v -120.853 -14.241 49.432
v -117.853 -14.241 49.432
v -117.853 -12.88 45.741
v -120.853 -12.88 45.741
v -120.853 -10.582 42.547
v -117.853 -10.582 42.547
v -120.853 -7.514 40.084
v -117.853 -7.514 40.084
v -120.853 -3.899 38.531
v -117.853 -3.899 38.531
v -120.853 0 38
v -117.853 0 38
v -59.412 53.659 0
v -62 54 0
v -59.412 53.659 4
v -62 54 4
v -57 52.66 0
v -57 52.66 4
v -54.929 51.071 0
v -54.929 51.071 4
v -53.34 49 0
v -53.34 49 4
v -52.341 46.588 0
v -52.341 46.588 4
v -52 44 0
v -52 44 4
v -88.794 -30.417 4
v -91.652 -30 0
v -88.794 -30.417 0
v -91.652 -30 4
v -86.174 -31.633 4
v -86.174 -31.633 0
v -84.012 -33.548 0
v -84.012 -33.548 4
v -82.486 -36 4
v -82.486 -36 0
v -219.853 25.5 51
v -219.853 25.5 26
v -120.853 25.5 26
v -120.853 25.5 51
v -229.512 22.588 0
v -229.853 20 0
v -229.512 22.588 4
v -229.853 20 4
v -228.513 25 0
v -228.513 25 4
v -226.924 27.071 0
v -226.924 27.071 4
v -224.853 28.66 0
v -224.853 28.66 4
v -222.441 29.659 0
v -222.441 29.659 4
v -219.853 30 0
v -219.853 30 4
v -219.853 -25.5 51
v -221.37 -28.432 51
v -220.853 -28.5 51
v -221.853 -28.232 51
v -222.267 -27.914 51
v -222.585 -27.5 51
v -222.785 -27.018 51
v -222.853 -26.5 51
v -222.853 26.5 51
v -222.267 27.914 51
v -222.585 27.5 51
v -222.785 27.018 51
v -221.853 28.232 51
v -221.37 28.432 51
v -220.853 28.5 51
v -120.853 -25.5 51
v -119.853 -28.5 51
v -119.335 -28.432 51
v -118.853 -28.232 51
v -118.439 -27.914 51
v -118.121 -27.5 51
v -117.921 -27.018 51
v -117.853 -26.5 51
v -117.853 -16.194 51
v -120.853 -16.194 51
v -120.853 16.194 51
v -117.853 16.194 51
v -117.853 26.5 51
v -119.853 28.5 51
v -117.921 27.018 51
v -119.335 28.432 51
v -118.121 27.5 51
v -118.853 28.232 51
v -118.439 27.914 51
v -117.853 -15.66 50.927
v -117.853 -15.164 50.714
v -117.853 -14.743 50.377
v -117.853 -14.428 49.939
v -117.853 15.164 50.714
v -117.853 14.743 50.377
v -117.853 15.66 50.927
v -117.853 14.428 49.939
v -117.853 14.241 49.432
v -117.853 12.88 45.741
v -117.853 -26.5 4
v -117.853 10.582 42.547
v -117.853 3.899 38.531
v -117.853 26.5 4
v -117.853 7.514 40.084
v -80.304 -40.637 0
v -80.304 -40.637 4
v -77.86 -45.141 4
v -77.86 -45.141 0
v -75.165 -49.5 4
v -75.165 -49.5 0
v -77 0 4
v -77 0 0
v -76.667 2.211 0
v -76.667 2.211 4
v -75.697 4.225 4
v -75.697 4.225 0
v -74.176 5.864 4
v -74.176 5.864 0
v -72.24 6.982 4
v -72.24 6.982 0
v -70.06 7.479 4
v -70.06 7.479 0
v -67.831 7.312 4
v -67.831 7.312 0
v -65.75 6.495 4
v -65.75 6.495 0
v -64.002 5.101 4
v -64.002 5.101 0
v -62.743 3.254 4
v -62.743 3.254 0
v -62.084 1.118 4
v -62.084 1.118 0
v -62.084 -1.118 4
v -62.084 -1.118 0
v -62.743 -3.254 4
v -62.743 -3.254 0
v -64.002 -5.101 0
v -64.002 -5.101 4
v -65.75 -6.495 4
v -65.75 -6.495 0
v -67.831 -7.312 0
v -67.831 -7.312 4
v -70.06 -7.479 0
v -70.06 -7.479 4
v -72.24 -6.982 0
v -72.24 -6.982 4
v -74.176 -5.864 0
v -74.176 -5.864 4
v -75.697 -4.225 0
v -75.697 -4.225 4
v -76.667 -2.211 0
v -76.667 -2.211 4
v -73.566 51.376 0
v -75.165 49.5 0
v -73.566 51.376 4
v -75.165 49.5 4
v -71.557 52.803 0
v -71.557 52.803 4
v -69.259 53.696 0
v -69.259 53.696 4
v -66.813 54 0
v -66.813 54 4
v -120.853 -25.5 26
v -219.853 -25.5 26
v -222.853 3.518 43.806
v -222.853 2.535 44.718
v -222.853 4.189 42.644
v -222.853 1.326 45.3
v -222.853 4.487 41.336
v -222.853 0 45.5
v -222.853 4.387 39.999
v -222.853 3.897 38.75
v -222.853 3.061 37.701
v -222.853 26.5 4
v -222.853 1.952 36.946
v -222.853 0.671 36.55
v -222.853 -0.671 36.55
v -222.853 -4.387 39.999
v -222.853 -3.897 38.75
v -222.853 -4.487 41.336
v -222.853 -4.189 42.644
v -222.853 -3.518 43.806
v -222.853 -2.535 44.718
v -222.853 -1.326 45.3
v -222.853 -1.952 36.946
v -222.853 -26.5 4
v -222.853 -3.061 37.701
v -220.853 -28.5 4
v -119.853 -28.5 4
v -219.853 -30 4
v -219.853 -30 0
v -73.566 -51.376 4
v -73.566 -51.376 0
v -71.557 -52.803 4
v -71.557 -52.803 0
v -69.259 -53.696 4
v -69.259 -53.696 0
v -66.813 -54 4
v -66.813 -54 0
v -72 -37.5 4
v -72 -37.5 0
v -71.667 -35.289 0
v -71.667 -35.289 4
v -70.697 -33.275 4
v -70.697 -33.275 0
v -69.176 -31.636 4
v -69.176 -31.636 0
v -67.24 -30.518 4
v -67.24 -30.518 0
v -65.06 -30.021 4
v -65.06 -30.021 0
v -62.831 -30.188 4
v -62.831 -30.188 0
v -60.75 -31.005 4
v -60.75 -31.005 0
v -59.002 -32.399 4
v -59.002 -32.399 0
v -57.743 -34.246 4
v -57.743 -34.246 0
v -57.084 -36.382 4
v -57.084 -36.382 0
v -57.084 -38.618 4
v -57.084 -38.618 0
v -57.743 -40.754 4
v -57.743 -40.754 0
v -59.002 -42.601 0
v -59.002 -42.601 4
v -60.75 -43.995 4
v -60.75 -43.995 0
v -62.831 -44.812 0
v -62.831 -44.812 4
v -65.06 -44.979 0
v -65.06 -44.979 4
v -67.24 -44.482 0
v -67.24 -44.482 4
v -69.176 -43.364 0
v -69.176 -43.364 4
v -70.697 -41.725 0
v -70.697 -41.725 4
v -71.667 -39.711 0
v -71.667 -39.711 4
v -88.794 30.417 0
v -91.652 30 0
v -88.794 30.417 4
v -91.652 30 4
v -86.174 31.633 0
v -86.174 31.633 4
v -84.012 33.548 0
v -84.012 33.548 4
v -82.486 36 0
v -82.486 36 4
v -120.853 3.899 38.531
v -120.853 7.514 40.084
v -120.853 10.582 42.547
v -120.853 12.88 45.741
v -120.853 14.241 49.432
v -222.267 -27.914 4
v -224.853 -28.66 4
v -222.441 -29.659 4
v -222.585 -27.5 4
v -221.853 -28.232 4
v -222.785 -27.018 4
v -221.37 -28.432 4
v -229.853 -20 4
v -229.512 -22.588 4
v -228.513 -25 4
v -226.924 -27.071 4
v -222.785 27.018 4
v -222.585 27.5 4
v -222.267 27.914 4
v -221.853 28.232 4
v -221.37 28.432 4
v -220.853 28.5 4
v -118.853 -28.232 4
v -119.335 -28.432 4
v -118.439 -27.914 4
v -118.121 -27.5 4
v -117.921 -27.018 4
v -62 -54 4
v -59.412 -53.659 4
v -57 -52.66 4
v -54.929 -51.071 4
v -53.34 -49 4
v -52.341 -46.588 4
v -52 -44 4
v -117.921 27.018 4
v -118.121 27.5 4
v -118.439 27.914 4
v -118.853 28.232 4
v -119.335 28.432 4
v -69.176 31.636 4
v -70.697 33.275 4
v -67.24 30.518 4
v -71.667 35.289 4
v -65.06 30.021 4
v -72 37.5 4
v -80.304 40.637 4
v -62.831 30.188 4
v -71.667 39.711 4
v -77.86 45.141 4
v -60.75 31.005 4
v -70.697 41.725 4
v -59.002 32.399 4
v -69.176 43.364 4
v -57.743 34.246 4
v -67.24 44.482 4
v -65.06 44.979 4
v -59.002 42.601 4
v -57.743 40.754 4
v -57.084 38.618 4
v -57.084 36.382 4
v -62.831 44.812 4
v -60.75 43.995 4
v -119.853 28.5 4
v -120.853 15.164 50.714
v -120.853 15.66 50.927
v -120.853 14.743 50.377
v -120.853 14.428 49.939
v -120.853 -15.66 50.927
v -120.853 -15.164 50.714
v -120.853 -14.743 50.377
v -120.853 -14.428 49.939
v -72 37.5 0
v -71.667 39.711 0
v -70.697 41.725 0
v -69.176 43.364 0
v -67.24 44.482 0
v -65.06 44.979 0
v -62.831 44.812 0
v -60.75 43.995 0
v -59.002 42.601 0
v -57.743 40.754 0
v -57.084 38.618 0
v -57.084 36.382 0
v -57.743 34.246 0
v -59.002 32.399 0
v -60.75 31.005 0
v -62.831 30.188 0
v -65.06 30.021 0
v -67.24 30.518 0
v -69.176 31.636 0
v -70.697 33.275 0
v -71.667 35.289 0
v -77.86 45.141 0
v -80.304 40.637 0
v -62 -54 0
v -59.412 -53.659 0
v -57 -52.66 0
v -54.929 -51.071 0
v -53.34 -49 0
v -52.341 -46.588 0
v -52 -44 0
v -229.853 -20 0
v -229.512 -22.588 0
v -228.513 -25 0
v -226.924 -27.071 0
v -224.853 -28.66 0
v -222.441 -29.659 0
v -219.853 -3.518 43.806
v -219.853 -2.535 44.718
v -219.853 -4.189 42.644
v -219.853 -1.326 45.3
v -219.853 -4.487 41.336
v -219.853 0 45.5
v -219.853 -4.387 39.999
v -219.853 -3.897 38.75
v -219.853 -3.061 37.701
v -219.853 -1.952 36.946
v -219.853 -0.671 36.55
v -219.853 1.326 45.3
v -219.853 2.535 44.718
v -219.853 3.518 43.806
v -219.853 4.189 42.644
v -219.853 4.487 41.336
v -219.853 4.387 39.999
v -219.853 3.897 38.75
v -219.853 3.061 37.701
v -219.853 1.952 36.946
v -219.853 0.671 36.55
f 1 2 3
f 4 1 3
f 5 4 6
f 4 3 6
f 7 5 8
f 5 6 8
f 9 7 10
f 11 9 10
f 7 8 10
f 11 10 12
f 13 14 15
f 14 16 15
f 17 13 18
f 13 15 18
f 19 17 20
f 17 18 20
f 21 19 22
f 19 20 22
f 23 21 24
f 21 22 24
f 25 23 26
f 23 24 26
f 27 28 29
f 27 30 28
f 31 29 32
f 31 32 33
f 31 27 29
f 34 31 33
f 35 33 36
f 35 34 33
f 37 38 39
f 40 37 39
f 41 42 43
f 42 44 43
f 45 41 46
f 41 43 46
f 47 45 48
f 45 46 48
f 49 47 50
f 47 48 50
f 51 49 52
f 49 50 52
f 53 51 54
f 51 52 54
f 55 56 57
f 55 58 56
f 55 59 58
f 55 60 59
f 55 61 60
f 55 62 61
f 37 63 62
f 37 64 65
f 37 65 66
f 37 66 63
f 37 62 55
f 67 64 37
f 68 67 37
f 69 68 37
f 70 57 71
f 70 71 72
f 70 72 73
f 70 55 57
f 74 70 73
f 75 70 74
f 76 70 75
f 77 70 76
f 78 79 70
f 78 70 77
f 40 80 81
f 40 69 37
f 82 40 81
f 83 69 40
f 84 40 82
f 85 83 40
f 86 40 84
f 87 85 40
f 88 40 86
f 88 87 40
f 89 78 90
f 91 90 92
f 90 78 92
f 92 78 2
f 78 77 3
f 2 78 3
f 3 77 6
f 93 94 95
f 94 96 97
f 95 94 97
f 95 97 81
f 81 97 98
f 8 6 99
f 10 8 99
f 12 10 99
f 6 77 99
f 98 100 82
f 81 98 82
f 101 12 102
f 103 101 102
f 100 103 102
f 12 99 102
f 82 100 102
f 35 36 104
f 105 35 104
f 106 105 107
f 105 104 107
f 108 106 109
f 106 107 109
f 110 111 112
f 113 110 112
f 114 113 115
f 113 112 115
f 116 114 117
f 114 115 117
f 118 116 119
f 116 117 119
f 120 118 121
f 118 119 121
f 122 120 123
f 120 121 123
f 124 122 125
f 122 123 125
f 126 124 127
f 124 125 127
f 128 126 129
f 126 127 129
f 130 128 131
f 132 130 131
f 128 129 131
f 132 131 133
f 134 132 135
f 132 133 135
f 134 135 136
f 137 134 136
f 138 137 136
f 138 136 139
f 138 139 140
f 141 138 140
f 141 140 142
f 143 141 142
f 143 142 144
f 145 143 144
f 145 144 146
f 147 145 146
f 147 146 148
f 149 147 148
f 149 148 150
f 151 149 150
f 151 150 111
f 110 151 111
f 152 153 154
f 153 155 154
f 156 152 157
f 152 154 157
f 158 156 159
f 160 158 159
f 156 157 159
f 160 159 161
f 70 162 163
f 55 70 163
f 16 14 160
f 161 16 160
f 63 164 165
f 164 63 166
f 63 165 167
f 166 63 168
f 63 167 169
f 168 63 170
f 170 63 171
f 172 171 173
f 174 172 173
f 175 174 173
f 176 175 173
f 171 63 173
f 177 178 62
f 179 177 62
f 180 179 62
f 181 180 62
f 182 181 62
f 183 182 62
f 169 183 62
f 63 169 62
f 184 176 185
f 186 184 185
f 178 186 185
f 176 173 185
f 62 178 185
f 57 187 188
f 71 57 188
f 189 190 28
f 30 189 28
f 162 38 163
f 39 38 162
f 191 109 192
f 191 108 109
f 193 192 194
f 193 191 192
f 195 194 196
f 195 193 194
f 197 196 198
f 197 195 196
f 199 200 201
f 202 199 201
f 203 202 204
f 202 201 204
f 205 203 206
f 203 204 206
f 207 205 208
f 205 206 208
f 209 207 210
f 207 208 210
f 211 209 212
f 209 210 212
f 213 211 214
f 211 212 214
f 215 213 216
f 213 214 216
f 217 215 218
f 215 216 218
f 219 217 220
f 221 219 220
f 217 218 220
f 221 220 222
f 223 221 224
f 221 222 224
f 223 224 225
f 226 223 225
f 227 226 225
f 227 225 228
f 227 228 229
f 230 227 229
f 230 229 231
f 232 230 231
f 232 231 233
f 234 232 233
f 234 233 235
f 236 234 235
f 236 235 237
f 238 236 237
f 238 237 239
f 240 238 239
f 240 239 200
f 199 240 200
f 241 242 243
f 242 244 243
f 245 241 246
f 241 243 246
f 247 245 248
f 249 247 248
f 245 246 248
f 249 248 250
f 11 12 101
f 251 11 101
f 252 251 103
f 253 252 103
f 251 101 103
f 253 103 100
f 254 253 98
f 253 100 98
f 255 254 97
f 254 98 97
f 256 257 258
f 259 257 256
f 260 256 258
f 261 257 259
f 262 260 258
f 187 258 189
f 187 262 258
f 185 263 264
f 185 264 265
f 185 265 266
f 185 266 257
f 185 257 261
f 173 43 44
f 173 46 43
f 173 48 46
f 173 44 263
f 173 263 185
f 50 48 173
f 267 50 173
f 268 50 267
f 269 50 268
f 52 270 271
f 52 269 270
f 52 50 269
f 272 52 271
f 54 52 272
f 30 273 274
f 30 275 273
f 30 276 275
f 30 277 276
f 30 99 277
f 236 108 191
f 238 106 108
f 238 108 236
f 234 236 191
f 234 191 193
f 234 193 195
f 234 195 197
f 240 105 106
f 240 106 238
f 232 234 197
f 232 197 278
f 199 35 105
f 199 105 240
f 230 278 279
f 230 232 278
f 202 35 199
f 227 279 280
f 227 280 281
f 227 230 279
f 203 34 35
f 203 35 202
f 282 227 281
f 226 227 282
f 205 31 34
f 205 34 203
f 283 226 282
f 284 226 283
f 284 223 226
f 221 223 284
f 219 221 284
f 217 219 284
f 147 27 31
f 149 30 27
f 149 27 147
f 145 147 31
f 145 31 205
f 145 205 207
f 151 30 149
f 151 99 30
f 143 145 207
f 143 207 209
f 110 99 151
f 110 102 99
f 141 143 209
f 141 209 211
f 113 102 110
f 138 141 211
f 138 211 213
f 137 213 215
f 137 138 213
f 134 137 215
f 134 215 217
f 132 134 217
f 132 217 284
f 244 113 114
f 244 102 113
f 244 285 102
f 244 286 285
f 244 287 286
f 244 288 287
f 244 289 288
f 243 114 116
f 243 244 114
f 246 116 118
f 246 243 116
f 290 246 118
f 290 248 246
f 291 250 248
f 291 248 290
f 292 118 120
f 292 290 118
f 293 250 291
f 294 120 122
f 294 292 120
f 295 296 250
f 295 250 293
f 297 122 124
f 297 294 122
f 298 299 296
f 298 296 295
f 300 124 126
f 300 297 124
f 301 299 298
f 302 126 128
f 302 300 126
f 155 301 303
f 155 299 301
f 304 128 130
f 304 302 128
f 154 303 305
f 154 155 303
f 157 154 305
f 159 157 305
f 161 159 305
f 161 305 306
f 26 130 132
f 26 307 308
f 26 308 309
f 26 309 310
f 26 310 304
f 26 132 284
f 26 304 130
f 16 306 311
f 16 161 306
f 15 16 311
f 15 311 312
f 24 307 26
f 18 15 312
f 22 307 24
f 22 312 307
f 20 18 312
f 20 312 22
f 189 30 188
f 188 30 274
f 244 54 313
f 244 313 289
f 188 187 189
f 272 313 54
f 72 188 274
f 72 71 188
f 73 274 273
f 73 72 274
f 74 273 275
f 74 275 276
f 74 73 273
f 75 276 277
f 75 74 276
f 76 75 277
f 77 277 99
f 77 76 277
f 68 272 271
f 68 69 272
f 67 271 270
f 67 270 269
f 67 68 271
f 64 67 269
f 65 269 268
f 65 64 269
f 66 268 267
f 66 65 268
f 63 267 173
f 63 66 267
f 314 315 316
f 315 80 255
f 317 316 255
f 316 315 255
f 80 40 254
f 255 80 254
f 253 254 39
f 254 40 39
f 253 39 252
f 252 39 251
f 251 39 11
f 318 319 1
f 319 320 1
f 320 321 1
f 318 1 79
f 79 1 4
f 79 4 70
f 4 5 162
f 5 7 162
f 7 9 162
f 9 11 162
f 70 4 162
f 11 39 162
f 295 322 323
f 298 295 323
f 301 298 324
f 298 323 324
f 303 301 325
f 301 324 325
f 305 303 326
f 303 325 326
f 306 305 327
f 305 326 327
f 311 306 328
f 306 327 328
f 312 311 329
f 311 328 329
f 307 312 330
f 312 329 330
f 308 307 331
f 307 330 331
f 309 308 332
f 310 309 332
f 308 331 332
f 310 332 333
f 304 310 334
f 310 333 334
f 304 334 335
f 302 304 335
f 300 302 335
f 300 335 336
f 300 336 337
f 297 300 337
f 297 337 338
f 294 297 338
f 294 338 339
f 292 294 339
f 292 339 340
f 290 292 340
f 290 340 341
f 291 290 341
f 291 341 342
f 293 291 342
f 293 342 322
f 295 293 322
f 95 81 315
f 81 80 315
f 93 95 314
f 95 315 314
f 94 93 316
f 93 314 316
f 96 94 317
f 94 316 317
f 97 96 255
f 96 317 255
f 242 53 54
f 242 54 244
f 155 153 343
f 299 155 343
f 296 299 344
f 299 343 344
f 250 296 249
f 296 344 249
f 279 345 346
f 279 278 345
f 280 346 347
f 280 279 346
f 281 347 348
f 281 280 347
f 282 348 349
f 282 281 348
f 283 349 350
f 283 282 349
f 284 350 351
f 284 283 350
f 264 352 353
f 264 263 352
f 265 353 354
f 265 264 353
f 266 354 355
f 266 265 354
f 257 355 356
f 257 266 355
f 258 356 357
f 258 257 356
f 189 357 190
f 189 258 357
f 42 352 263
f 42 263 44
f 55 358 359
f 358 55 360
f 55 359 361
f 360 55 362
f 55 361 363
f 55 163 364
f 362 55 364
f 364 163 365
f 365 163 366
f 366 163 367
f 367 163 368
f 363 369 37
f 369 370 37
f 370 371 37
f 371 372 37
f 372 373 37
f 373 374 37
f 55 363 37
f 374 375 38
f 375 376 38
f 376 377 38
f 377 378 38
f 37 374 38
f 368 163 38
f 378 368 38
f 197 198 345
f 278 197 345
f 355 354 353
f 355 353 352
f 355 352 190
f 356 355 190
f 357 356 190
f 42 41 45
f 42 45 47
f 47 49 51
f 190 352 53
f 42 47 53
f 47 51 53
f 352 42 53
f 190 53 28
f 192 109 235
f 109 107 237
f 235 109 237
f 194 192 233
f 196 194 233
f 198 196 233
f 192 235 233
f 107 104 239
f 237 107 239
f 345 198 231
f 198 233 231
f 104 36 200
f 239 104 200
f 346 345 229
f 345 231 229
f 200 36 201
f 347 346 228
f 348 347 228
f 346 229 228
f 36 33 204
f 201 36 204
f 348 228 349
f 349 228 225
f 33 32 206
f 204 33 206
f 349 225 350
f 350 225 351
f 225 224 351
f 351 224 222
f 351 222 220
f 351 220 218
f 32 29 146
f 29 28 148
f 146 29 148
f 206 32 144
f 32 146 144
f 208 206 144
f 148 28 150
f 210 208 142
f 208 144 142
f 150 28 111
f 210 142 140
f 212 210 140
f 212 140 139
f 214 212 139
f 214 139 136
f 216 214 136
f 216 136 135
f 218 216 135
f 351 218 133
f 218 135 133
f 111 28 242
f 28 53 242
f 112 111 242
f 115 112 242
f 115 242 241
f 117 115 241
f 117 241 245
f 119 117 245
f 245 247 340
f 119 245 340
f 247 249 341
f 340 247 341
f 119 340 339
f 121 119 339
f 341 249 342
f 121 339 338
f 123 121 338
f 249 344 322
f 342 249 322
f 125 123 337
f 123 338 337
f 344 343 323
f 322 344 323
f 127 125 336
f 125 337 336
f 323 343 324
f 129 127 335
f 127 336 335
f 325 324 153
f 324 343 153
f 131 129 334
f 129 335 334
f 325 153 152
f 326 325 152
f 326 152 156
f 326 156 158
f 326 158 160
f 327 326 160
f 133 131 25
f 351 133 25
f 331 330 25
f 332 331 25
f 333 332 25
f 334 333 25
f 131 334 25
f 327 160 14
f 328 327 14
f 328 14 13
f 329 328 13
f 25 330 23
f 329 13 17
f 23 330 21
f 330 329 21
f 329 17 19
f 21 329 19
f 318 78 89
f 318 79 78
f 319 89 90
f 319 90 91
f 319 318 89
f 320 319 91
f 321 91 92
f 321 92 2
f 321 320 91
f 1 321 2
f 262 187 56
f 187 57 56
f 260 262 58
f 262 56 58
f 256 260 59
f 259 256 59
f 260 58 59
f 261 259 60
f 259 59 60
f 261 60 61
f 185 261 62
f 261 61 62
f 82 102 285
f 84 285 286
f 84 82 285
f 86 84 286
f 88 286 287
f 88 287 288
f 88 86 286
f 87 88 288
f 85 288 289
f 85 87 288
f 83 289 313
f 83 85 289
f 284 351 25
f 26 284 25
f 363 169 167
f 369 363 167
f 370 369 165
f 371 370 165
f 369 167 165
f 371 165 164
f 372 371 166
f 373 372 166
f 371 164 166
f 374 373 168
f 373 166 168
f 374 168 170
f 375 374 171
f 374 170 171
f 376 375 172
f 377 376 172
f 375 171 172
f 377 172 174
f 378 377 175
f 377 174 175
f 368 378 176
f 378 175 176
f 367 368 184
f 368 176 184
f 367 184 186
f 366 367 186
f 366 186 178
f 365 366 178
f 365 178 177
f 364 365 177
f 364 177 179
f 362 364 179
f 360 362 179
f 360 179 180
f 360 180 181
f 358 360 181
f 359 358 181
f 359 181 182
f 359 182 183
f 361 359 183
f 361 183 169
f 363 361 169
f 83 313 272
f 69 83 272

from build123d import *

# Parameters (mm, degrees)
RESSALTO_EXTRUS_O1_DEPTH = 4
ESBO_O2_R                = 7.5
CORTE_EXTRUS_O1_DEPTH    = 10
ESBO_O3_W                = 145
ESBO_O3_H                = 60
RESSALTO_EXTRUS_O3_DEPTH = 4
RESSALTO_EXTRUS_O4_DEPTH = 47
CORTE_EXTRUS_O3_DEPTH    = 10
ESBO_O6_R                = 4.5
CORTE_EXTRUS_O4_DEPTH    = 9
FILETE1_R                = 10
FILETE3_R                = 10
FILETE4_R                = 2
ESBO_O7_W                = 99
ESBO_O7_H                = 51
RESSALTO_EXTRUS_O5_DEPTH = 22


with BuildPart() as part:
    # Esboço1 → Ressalto-extrusão1 (new body)
    with BuildSketch(Plane.XY):
        with BuildLine():
            Line((-72, -54), (-52, -54))
            Line((-52, -54), (-52, 54))
            Line((-52, 54), (-72, 54))
            ThreePointArc((-72, 54), (-90, 0), (-72, -54))
        make_face()
    extrude(amount=RESSALTO_EXTRUS_O1_DEPTH)

    # Esboço2 → Corte-extrusão1 (cut)
    with BuildSketch(Plane(origin=(0, 0, 0), x_dir=(-1, 0, 0), z_dir=(0, 0, -1))):
        with Locations((69.5, 0)):
            Circle(ESBO_O2_R)
        with Locations((64.5, -37.5)):
            Circle(ESBO_O2_R)
        with Locations((64.5, 37.5)):
            Circle(ESBO_O2_R)
    extrude(amount=-CORTE_EXTRUS_O1_DEPTH, mode=Mode.SUBTRACT)

    # Esboço3 → Ressalto-extrusão3 (add)
    with BuildSketch(Plane.XY):
        with Locations((-157.352813742, 0)):
            Rectangle(ESBO_O3_W, ESBO_O3_H)
    extrude(amount=RESSALTO_EXTRUS_O3_DEPTH)

    # Esboço4 → Ressalto-extrusão4 (add)
    with BuildSketch(Plane.XY.offset(4)):
        Polygon((-219.852813742, 0), (-222.852813742, 0), (-222.852813742, -28.5), (-117.852813742, -28.5), (-117.852813742, 0), (-120.852813742, 0), (-120.852813742, -25.5), (-219.852813742, -25.5), align=None)
        Polygon((-222.852813742, 28.5), (-222.852813742, 0), (-219.852813742, 0), (-219.852813742, 25.5), (-120.852813742, 25.5), (-120.852813742, 0), (-117.852813742, 0), (-117.852813742, 28.5), align=None)
    extrude(amount=RESSALTO_EXTRUS_O4_DEPTH)

    # Esboço5 → Corte-extrusão3 (cut)
    with BuildSketch(Plane(origin=(-117.852813742, 0, 0), x_dir=(0, 0, -1), z_dir=(1, 0, 0))):
        with BuildLine():
            Line((-51, 14.5), (-51, -14.5))
            ThreePointArc((-51, -14.5), (-41.725847678, -9.737171047), (-38, 0))
            ThreePointArc((-38, 0), (-41.725847678, 9.737171047), (-51, 14.5))
        make_face()
    extrude(amount=-CORTE_EXTRUS_O3_DEPTH, mode=Mode.SUBTRACT)

    # Esboço6 → Corte-extrusão4 (cut)
    with BuildSketch(Plane.ZY.offset(222.852813742)):
        with Locations((41, 0)):
            Circle(ESBO_O6_R)
    extrude(amount=-CORTE_EXTRUS_O4_DEPTH, mode=Mode.SUBTRACT)

    # Filete1
    filete1_edges = [part.edges().sort_by_distance(p)[0] for p in [
        (-229.852813742, 30, 2),
        (-229.852813742, -30, 2),
    ]]
    fillet(filete1_edges, radius=FILETE1_R)

    # Filete3
    filete3_edges = [part.edges().sort_by_distance(p)[0] for p in [
        (-84.852813742, 30, 2),
        (-84.852813742, -30, 2),
        (-72, 54, 2),
        (-52, 54, 2),
        (-52, -54, 2),
        (-72, -54, 2),
    ]]
    fillet(filete3_edges, radius=FILETE3_R)

    # Filete4
    filete4_edges = [part.edges().sort_by_distance(p)[0] for p in [
        (-117.852813742, -28.5, 27.5),
        (-117.852813742, 28.5, 27.5),
        (-222.852813742, 28.5, 27.5),
        (-222.852813742, -28.5, 27.5),
        (-119.352813742, 14.5, 51),
        (-119.352813742, -14.5, 51),
    ]]
    fillet(filete4_edges, radius=FILETE4_R)

    # Esboço7 → Ressalto-extrusão5 (add)
    with BuildSketch(Plane.XY.offset(4)):
        with Locations((-170.352813742, 0)):
            Rectangle(ESBO_O7_W, ESBO_O7_H)
    extrude(amount=RESSALTO_EXTRUS_O5_DEPTH)


solid = part.part
